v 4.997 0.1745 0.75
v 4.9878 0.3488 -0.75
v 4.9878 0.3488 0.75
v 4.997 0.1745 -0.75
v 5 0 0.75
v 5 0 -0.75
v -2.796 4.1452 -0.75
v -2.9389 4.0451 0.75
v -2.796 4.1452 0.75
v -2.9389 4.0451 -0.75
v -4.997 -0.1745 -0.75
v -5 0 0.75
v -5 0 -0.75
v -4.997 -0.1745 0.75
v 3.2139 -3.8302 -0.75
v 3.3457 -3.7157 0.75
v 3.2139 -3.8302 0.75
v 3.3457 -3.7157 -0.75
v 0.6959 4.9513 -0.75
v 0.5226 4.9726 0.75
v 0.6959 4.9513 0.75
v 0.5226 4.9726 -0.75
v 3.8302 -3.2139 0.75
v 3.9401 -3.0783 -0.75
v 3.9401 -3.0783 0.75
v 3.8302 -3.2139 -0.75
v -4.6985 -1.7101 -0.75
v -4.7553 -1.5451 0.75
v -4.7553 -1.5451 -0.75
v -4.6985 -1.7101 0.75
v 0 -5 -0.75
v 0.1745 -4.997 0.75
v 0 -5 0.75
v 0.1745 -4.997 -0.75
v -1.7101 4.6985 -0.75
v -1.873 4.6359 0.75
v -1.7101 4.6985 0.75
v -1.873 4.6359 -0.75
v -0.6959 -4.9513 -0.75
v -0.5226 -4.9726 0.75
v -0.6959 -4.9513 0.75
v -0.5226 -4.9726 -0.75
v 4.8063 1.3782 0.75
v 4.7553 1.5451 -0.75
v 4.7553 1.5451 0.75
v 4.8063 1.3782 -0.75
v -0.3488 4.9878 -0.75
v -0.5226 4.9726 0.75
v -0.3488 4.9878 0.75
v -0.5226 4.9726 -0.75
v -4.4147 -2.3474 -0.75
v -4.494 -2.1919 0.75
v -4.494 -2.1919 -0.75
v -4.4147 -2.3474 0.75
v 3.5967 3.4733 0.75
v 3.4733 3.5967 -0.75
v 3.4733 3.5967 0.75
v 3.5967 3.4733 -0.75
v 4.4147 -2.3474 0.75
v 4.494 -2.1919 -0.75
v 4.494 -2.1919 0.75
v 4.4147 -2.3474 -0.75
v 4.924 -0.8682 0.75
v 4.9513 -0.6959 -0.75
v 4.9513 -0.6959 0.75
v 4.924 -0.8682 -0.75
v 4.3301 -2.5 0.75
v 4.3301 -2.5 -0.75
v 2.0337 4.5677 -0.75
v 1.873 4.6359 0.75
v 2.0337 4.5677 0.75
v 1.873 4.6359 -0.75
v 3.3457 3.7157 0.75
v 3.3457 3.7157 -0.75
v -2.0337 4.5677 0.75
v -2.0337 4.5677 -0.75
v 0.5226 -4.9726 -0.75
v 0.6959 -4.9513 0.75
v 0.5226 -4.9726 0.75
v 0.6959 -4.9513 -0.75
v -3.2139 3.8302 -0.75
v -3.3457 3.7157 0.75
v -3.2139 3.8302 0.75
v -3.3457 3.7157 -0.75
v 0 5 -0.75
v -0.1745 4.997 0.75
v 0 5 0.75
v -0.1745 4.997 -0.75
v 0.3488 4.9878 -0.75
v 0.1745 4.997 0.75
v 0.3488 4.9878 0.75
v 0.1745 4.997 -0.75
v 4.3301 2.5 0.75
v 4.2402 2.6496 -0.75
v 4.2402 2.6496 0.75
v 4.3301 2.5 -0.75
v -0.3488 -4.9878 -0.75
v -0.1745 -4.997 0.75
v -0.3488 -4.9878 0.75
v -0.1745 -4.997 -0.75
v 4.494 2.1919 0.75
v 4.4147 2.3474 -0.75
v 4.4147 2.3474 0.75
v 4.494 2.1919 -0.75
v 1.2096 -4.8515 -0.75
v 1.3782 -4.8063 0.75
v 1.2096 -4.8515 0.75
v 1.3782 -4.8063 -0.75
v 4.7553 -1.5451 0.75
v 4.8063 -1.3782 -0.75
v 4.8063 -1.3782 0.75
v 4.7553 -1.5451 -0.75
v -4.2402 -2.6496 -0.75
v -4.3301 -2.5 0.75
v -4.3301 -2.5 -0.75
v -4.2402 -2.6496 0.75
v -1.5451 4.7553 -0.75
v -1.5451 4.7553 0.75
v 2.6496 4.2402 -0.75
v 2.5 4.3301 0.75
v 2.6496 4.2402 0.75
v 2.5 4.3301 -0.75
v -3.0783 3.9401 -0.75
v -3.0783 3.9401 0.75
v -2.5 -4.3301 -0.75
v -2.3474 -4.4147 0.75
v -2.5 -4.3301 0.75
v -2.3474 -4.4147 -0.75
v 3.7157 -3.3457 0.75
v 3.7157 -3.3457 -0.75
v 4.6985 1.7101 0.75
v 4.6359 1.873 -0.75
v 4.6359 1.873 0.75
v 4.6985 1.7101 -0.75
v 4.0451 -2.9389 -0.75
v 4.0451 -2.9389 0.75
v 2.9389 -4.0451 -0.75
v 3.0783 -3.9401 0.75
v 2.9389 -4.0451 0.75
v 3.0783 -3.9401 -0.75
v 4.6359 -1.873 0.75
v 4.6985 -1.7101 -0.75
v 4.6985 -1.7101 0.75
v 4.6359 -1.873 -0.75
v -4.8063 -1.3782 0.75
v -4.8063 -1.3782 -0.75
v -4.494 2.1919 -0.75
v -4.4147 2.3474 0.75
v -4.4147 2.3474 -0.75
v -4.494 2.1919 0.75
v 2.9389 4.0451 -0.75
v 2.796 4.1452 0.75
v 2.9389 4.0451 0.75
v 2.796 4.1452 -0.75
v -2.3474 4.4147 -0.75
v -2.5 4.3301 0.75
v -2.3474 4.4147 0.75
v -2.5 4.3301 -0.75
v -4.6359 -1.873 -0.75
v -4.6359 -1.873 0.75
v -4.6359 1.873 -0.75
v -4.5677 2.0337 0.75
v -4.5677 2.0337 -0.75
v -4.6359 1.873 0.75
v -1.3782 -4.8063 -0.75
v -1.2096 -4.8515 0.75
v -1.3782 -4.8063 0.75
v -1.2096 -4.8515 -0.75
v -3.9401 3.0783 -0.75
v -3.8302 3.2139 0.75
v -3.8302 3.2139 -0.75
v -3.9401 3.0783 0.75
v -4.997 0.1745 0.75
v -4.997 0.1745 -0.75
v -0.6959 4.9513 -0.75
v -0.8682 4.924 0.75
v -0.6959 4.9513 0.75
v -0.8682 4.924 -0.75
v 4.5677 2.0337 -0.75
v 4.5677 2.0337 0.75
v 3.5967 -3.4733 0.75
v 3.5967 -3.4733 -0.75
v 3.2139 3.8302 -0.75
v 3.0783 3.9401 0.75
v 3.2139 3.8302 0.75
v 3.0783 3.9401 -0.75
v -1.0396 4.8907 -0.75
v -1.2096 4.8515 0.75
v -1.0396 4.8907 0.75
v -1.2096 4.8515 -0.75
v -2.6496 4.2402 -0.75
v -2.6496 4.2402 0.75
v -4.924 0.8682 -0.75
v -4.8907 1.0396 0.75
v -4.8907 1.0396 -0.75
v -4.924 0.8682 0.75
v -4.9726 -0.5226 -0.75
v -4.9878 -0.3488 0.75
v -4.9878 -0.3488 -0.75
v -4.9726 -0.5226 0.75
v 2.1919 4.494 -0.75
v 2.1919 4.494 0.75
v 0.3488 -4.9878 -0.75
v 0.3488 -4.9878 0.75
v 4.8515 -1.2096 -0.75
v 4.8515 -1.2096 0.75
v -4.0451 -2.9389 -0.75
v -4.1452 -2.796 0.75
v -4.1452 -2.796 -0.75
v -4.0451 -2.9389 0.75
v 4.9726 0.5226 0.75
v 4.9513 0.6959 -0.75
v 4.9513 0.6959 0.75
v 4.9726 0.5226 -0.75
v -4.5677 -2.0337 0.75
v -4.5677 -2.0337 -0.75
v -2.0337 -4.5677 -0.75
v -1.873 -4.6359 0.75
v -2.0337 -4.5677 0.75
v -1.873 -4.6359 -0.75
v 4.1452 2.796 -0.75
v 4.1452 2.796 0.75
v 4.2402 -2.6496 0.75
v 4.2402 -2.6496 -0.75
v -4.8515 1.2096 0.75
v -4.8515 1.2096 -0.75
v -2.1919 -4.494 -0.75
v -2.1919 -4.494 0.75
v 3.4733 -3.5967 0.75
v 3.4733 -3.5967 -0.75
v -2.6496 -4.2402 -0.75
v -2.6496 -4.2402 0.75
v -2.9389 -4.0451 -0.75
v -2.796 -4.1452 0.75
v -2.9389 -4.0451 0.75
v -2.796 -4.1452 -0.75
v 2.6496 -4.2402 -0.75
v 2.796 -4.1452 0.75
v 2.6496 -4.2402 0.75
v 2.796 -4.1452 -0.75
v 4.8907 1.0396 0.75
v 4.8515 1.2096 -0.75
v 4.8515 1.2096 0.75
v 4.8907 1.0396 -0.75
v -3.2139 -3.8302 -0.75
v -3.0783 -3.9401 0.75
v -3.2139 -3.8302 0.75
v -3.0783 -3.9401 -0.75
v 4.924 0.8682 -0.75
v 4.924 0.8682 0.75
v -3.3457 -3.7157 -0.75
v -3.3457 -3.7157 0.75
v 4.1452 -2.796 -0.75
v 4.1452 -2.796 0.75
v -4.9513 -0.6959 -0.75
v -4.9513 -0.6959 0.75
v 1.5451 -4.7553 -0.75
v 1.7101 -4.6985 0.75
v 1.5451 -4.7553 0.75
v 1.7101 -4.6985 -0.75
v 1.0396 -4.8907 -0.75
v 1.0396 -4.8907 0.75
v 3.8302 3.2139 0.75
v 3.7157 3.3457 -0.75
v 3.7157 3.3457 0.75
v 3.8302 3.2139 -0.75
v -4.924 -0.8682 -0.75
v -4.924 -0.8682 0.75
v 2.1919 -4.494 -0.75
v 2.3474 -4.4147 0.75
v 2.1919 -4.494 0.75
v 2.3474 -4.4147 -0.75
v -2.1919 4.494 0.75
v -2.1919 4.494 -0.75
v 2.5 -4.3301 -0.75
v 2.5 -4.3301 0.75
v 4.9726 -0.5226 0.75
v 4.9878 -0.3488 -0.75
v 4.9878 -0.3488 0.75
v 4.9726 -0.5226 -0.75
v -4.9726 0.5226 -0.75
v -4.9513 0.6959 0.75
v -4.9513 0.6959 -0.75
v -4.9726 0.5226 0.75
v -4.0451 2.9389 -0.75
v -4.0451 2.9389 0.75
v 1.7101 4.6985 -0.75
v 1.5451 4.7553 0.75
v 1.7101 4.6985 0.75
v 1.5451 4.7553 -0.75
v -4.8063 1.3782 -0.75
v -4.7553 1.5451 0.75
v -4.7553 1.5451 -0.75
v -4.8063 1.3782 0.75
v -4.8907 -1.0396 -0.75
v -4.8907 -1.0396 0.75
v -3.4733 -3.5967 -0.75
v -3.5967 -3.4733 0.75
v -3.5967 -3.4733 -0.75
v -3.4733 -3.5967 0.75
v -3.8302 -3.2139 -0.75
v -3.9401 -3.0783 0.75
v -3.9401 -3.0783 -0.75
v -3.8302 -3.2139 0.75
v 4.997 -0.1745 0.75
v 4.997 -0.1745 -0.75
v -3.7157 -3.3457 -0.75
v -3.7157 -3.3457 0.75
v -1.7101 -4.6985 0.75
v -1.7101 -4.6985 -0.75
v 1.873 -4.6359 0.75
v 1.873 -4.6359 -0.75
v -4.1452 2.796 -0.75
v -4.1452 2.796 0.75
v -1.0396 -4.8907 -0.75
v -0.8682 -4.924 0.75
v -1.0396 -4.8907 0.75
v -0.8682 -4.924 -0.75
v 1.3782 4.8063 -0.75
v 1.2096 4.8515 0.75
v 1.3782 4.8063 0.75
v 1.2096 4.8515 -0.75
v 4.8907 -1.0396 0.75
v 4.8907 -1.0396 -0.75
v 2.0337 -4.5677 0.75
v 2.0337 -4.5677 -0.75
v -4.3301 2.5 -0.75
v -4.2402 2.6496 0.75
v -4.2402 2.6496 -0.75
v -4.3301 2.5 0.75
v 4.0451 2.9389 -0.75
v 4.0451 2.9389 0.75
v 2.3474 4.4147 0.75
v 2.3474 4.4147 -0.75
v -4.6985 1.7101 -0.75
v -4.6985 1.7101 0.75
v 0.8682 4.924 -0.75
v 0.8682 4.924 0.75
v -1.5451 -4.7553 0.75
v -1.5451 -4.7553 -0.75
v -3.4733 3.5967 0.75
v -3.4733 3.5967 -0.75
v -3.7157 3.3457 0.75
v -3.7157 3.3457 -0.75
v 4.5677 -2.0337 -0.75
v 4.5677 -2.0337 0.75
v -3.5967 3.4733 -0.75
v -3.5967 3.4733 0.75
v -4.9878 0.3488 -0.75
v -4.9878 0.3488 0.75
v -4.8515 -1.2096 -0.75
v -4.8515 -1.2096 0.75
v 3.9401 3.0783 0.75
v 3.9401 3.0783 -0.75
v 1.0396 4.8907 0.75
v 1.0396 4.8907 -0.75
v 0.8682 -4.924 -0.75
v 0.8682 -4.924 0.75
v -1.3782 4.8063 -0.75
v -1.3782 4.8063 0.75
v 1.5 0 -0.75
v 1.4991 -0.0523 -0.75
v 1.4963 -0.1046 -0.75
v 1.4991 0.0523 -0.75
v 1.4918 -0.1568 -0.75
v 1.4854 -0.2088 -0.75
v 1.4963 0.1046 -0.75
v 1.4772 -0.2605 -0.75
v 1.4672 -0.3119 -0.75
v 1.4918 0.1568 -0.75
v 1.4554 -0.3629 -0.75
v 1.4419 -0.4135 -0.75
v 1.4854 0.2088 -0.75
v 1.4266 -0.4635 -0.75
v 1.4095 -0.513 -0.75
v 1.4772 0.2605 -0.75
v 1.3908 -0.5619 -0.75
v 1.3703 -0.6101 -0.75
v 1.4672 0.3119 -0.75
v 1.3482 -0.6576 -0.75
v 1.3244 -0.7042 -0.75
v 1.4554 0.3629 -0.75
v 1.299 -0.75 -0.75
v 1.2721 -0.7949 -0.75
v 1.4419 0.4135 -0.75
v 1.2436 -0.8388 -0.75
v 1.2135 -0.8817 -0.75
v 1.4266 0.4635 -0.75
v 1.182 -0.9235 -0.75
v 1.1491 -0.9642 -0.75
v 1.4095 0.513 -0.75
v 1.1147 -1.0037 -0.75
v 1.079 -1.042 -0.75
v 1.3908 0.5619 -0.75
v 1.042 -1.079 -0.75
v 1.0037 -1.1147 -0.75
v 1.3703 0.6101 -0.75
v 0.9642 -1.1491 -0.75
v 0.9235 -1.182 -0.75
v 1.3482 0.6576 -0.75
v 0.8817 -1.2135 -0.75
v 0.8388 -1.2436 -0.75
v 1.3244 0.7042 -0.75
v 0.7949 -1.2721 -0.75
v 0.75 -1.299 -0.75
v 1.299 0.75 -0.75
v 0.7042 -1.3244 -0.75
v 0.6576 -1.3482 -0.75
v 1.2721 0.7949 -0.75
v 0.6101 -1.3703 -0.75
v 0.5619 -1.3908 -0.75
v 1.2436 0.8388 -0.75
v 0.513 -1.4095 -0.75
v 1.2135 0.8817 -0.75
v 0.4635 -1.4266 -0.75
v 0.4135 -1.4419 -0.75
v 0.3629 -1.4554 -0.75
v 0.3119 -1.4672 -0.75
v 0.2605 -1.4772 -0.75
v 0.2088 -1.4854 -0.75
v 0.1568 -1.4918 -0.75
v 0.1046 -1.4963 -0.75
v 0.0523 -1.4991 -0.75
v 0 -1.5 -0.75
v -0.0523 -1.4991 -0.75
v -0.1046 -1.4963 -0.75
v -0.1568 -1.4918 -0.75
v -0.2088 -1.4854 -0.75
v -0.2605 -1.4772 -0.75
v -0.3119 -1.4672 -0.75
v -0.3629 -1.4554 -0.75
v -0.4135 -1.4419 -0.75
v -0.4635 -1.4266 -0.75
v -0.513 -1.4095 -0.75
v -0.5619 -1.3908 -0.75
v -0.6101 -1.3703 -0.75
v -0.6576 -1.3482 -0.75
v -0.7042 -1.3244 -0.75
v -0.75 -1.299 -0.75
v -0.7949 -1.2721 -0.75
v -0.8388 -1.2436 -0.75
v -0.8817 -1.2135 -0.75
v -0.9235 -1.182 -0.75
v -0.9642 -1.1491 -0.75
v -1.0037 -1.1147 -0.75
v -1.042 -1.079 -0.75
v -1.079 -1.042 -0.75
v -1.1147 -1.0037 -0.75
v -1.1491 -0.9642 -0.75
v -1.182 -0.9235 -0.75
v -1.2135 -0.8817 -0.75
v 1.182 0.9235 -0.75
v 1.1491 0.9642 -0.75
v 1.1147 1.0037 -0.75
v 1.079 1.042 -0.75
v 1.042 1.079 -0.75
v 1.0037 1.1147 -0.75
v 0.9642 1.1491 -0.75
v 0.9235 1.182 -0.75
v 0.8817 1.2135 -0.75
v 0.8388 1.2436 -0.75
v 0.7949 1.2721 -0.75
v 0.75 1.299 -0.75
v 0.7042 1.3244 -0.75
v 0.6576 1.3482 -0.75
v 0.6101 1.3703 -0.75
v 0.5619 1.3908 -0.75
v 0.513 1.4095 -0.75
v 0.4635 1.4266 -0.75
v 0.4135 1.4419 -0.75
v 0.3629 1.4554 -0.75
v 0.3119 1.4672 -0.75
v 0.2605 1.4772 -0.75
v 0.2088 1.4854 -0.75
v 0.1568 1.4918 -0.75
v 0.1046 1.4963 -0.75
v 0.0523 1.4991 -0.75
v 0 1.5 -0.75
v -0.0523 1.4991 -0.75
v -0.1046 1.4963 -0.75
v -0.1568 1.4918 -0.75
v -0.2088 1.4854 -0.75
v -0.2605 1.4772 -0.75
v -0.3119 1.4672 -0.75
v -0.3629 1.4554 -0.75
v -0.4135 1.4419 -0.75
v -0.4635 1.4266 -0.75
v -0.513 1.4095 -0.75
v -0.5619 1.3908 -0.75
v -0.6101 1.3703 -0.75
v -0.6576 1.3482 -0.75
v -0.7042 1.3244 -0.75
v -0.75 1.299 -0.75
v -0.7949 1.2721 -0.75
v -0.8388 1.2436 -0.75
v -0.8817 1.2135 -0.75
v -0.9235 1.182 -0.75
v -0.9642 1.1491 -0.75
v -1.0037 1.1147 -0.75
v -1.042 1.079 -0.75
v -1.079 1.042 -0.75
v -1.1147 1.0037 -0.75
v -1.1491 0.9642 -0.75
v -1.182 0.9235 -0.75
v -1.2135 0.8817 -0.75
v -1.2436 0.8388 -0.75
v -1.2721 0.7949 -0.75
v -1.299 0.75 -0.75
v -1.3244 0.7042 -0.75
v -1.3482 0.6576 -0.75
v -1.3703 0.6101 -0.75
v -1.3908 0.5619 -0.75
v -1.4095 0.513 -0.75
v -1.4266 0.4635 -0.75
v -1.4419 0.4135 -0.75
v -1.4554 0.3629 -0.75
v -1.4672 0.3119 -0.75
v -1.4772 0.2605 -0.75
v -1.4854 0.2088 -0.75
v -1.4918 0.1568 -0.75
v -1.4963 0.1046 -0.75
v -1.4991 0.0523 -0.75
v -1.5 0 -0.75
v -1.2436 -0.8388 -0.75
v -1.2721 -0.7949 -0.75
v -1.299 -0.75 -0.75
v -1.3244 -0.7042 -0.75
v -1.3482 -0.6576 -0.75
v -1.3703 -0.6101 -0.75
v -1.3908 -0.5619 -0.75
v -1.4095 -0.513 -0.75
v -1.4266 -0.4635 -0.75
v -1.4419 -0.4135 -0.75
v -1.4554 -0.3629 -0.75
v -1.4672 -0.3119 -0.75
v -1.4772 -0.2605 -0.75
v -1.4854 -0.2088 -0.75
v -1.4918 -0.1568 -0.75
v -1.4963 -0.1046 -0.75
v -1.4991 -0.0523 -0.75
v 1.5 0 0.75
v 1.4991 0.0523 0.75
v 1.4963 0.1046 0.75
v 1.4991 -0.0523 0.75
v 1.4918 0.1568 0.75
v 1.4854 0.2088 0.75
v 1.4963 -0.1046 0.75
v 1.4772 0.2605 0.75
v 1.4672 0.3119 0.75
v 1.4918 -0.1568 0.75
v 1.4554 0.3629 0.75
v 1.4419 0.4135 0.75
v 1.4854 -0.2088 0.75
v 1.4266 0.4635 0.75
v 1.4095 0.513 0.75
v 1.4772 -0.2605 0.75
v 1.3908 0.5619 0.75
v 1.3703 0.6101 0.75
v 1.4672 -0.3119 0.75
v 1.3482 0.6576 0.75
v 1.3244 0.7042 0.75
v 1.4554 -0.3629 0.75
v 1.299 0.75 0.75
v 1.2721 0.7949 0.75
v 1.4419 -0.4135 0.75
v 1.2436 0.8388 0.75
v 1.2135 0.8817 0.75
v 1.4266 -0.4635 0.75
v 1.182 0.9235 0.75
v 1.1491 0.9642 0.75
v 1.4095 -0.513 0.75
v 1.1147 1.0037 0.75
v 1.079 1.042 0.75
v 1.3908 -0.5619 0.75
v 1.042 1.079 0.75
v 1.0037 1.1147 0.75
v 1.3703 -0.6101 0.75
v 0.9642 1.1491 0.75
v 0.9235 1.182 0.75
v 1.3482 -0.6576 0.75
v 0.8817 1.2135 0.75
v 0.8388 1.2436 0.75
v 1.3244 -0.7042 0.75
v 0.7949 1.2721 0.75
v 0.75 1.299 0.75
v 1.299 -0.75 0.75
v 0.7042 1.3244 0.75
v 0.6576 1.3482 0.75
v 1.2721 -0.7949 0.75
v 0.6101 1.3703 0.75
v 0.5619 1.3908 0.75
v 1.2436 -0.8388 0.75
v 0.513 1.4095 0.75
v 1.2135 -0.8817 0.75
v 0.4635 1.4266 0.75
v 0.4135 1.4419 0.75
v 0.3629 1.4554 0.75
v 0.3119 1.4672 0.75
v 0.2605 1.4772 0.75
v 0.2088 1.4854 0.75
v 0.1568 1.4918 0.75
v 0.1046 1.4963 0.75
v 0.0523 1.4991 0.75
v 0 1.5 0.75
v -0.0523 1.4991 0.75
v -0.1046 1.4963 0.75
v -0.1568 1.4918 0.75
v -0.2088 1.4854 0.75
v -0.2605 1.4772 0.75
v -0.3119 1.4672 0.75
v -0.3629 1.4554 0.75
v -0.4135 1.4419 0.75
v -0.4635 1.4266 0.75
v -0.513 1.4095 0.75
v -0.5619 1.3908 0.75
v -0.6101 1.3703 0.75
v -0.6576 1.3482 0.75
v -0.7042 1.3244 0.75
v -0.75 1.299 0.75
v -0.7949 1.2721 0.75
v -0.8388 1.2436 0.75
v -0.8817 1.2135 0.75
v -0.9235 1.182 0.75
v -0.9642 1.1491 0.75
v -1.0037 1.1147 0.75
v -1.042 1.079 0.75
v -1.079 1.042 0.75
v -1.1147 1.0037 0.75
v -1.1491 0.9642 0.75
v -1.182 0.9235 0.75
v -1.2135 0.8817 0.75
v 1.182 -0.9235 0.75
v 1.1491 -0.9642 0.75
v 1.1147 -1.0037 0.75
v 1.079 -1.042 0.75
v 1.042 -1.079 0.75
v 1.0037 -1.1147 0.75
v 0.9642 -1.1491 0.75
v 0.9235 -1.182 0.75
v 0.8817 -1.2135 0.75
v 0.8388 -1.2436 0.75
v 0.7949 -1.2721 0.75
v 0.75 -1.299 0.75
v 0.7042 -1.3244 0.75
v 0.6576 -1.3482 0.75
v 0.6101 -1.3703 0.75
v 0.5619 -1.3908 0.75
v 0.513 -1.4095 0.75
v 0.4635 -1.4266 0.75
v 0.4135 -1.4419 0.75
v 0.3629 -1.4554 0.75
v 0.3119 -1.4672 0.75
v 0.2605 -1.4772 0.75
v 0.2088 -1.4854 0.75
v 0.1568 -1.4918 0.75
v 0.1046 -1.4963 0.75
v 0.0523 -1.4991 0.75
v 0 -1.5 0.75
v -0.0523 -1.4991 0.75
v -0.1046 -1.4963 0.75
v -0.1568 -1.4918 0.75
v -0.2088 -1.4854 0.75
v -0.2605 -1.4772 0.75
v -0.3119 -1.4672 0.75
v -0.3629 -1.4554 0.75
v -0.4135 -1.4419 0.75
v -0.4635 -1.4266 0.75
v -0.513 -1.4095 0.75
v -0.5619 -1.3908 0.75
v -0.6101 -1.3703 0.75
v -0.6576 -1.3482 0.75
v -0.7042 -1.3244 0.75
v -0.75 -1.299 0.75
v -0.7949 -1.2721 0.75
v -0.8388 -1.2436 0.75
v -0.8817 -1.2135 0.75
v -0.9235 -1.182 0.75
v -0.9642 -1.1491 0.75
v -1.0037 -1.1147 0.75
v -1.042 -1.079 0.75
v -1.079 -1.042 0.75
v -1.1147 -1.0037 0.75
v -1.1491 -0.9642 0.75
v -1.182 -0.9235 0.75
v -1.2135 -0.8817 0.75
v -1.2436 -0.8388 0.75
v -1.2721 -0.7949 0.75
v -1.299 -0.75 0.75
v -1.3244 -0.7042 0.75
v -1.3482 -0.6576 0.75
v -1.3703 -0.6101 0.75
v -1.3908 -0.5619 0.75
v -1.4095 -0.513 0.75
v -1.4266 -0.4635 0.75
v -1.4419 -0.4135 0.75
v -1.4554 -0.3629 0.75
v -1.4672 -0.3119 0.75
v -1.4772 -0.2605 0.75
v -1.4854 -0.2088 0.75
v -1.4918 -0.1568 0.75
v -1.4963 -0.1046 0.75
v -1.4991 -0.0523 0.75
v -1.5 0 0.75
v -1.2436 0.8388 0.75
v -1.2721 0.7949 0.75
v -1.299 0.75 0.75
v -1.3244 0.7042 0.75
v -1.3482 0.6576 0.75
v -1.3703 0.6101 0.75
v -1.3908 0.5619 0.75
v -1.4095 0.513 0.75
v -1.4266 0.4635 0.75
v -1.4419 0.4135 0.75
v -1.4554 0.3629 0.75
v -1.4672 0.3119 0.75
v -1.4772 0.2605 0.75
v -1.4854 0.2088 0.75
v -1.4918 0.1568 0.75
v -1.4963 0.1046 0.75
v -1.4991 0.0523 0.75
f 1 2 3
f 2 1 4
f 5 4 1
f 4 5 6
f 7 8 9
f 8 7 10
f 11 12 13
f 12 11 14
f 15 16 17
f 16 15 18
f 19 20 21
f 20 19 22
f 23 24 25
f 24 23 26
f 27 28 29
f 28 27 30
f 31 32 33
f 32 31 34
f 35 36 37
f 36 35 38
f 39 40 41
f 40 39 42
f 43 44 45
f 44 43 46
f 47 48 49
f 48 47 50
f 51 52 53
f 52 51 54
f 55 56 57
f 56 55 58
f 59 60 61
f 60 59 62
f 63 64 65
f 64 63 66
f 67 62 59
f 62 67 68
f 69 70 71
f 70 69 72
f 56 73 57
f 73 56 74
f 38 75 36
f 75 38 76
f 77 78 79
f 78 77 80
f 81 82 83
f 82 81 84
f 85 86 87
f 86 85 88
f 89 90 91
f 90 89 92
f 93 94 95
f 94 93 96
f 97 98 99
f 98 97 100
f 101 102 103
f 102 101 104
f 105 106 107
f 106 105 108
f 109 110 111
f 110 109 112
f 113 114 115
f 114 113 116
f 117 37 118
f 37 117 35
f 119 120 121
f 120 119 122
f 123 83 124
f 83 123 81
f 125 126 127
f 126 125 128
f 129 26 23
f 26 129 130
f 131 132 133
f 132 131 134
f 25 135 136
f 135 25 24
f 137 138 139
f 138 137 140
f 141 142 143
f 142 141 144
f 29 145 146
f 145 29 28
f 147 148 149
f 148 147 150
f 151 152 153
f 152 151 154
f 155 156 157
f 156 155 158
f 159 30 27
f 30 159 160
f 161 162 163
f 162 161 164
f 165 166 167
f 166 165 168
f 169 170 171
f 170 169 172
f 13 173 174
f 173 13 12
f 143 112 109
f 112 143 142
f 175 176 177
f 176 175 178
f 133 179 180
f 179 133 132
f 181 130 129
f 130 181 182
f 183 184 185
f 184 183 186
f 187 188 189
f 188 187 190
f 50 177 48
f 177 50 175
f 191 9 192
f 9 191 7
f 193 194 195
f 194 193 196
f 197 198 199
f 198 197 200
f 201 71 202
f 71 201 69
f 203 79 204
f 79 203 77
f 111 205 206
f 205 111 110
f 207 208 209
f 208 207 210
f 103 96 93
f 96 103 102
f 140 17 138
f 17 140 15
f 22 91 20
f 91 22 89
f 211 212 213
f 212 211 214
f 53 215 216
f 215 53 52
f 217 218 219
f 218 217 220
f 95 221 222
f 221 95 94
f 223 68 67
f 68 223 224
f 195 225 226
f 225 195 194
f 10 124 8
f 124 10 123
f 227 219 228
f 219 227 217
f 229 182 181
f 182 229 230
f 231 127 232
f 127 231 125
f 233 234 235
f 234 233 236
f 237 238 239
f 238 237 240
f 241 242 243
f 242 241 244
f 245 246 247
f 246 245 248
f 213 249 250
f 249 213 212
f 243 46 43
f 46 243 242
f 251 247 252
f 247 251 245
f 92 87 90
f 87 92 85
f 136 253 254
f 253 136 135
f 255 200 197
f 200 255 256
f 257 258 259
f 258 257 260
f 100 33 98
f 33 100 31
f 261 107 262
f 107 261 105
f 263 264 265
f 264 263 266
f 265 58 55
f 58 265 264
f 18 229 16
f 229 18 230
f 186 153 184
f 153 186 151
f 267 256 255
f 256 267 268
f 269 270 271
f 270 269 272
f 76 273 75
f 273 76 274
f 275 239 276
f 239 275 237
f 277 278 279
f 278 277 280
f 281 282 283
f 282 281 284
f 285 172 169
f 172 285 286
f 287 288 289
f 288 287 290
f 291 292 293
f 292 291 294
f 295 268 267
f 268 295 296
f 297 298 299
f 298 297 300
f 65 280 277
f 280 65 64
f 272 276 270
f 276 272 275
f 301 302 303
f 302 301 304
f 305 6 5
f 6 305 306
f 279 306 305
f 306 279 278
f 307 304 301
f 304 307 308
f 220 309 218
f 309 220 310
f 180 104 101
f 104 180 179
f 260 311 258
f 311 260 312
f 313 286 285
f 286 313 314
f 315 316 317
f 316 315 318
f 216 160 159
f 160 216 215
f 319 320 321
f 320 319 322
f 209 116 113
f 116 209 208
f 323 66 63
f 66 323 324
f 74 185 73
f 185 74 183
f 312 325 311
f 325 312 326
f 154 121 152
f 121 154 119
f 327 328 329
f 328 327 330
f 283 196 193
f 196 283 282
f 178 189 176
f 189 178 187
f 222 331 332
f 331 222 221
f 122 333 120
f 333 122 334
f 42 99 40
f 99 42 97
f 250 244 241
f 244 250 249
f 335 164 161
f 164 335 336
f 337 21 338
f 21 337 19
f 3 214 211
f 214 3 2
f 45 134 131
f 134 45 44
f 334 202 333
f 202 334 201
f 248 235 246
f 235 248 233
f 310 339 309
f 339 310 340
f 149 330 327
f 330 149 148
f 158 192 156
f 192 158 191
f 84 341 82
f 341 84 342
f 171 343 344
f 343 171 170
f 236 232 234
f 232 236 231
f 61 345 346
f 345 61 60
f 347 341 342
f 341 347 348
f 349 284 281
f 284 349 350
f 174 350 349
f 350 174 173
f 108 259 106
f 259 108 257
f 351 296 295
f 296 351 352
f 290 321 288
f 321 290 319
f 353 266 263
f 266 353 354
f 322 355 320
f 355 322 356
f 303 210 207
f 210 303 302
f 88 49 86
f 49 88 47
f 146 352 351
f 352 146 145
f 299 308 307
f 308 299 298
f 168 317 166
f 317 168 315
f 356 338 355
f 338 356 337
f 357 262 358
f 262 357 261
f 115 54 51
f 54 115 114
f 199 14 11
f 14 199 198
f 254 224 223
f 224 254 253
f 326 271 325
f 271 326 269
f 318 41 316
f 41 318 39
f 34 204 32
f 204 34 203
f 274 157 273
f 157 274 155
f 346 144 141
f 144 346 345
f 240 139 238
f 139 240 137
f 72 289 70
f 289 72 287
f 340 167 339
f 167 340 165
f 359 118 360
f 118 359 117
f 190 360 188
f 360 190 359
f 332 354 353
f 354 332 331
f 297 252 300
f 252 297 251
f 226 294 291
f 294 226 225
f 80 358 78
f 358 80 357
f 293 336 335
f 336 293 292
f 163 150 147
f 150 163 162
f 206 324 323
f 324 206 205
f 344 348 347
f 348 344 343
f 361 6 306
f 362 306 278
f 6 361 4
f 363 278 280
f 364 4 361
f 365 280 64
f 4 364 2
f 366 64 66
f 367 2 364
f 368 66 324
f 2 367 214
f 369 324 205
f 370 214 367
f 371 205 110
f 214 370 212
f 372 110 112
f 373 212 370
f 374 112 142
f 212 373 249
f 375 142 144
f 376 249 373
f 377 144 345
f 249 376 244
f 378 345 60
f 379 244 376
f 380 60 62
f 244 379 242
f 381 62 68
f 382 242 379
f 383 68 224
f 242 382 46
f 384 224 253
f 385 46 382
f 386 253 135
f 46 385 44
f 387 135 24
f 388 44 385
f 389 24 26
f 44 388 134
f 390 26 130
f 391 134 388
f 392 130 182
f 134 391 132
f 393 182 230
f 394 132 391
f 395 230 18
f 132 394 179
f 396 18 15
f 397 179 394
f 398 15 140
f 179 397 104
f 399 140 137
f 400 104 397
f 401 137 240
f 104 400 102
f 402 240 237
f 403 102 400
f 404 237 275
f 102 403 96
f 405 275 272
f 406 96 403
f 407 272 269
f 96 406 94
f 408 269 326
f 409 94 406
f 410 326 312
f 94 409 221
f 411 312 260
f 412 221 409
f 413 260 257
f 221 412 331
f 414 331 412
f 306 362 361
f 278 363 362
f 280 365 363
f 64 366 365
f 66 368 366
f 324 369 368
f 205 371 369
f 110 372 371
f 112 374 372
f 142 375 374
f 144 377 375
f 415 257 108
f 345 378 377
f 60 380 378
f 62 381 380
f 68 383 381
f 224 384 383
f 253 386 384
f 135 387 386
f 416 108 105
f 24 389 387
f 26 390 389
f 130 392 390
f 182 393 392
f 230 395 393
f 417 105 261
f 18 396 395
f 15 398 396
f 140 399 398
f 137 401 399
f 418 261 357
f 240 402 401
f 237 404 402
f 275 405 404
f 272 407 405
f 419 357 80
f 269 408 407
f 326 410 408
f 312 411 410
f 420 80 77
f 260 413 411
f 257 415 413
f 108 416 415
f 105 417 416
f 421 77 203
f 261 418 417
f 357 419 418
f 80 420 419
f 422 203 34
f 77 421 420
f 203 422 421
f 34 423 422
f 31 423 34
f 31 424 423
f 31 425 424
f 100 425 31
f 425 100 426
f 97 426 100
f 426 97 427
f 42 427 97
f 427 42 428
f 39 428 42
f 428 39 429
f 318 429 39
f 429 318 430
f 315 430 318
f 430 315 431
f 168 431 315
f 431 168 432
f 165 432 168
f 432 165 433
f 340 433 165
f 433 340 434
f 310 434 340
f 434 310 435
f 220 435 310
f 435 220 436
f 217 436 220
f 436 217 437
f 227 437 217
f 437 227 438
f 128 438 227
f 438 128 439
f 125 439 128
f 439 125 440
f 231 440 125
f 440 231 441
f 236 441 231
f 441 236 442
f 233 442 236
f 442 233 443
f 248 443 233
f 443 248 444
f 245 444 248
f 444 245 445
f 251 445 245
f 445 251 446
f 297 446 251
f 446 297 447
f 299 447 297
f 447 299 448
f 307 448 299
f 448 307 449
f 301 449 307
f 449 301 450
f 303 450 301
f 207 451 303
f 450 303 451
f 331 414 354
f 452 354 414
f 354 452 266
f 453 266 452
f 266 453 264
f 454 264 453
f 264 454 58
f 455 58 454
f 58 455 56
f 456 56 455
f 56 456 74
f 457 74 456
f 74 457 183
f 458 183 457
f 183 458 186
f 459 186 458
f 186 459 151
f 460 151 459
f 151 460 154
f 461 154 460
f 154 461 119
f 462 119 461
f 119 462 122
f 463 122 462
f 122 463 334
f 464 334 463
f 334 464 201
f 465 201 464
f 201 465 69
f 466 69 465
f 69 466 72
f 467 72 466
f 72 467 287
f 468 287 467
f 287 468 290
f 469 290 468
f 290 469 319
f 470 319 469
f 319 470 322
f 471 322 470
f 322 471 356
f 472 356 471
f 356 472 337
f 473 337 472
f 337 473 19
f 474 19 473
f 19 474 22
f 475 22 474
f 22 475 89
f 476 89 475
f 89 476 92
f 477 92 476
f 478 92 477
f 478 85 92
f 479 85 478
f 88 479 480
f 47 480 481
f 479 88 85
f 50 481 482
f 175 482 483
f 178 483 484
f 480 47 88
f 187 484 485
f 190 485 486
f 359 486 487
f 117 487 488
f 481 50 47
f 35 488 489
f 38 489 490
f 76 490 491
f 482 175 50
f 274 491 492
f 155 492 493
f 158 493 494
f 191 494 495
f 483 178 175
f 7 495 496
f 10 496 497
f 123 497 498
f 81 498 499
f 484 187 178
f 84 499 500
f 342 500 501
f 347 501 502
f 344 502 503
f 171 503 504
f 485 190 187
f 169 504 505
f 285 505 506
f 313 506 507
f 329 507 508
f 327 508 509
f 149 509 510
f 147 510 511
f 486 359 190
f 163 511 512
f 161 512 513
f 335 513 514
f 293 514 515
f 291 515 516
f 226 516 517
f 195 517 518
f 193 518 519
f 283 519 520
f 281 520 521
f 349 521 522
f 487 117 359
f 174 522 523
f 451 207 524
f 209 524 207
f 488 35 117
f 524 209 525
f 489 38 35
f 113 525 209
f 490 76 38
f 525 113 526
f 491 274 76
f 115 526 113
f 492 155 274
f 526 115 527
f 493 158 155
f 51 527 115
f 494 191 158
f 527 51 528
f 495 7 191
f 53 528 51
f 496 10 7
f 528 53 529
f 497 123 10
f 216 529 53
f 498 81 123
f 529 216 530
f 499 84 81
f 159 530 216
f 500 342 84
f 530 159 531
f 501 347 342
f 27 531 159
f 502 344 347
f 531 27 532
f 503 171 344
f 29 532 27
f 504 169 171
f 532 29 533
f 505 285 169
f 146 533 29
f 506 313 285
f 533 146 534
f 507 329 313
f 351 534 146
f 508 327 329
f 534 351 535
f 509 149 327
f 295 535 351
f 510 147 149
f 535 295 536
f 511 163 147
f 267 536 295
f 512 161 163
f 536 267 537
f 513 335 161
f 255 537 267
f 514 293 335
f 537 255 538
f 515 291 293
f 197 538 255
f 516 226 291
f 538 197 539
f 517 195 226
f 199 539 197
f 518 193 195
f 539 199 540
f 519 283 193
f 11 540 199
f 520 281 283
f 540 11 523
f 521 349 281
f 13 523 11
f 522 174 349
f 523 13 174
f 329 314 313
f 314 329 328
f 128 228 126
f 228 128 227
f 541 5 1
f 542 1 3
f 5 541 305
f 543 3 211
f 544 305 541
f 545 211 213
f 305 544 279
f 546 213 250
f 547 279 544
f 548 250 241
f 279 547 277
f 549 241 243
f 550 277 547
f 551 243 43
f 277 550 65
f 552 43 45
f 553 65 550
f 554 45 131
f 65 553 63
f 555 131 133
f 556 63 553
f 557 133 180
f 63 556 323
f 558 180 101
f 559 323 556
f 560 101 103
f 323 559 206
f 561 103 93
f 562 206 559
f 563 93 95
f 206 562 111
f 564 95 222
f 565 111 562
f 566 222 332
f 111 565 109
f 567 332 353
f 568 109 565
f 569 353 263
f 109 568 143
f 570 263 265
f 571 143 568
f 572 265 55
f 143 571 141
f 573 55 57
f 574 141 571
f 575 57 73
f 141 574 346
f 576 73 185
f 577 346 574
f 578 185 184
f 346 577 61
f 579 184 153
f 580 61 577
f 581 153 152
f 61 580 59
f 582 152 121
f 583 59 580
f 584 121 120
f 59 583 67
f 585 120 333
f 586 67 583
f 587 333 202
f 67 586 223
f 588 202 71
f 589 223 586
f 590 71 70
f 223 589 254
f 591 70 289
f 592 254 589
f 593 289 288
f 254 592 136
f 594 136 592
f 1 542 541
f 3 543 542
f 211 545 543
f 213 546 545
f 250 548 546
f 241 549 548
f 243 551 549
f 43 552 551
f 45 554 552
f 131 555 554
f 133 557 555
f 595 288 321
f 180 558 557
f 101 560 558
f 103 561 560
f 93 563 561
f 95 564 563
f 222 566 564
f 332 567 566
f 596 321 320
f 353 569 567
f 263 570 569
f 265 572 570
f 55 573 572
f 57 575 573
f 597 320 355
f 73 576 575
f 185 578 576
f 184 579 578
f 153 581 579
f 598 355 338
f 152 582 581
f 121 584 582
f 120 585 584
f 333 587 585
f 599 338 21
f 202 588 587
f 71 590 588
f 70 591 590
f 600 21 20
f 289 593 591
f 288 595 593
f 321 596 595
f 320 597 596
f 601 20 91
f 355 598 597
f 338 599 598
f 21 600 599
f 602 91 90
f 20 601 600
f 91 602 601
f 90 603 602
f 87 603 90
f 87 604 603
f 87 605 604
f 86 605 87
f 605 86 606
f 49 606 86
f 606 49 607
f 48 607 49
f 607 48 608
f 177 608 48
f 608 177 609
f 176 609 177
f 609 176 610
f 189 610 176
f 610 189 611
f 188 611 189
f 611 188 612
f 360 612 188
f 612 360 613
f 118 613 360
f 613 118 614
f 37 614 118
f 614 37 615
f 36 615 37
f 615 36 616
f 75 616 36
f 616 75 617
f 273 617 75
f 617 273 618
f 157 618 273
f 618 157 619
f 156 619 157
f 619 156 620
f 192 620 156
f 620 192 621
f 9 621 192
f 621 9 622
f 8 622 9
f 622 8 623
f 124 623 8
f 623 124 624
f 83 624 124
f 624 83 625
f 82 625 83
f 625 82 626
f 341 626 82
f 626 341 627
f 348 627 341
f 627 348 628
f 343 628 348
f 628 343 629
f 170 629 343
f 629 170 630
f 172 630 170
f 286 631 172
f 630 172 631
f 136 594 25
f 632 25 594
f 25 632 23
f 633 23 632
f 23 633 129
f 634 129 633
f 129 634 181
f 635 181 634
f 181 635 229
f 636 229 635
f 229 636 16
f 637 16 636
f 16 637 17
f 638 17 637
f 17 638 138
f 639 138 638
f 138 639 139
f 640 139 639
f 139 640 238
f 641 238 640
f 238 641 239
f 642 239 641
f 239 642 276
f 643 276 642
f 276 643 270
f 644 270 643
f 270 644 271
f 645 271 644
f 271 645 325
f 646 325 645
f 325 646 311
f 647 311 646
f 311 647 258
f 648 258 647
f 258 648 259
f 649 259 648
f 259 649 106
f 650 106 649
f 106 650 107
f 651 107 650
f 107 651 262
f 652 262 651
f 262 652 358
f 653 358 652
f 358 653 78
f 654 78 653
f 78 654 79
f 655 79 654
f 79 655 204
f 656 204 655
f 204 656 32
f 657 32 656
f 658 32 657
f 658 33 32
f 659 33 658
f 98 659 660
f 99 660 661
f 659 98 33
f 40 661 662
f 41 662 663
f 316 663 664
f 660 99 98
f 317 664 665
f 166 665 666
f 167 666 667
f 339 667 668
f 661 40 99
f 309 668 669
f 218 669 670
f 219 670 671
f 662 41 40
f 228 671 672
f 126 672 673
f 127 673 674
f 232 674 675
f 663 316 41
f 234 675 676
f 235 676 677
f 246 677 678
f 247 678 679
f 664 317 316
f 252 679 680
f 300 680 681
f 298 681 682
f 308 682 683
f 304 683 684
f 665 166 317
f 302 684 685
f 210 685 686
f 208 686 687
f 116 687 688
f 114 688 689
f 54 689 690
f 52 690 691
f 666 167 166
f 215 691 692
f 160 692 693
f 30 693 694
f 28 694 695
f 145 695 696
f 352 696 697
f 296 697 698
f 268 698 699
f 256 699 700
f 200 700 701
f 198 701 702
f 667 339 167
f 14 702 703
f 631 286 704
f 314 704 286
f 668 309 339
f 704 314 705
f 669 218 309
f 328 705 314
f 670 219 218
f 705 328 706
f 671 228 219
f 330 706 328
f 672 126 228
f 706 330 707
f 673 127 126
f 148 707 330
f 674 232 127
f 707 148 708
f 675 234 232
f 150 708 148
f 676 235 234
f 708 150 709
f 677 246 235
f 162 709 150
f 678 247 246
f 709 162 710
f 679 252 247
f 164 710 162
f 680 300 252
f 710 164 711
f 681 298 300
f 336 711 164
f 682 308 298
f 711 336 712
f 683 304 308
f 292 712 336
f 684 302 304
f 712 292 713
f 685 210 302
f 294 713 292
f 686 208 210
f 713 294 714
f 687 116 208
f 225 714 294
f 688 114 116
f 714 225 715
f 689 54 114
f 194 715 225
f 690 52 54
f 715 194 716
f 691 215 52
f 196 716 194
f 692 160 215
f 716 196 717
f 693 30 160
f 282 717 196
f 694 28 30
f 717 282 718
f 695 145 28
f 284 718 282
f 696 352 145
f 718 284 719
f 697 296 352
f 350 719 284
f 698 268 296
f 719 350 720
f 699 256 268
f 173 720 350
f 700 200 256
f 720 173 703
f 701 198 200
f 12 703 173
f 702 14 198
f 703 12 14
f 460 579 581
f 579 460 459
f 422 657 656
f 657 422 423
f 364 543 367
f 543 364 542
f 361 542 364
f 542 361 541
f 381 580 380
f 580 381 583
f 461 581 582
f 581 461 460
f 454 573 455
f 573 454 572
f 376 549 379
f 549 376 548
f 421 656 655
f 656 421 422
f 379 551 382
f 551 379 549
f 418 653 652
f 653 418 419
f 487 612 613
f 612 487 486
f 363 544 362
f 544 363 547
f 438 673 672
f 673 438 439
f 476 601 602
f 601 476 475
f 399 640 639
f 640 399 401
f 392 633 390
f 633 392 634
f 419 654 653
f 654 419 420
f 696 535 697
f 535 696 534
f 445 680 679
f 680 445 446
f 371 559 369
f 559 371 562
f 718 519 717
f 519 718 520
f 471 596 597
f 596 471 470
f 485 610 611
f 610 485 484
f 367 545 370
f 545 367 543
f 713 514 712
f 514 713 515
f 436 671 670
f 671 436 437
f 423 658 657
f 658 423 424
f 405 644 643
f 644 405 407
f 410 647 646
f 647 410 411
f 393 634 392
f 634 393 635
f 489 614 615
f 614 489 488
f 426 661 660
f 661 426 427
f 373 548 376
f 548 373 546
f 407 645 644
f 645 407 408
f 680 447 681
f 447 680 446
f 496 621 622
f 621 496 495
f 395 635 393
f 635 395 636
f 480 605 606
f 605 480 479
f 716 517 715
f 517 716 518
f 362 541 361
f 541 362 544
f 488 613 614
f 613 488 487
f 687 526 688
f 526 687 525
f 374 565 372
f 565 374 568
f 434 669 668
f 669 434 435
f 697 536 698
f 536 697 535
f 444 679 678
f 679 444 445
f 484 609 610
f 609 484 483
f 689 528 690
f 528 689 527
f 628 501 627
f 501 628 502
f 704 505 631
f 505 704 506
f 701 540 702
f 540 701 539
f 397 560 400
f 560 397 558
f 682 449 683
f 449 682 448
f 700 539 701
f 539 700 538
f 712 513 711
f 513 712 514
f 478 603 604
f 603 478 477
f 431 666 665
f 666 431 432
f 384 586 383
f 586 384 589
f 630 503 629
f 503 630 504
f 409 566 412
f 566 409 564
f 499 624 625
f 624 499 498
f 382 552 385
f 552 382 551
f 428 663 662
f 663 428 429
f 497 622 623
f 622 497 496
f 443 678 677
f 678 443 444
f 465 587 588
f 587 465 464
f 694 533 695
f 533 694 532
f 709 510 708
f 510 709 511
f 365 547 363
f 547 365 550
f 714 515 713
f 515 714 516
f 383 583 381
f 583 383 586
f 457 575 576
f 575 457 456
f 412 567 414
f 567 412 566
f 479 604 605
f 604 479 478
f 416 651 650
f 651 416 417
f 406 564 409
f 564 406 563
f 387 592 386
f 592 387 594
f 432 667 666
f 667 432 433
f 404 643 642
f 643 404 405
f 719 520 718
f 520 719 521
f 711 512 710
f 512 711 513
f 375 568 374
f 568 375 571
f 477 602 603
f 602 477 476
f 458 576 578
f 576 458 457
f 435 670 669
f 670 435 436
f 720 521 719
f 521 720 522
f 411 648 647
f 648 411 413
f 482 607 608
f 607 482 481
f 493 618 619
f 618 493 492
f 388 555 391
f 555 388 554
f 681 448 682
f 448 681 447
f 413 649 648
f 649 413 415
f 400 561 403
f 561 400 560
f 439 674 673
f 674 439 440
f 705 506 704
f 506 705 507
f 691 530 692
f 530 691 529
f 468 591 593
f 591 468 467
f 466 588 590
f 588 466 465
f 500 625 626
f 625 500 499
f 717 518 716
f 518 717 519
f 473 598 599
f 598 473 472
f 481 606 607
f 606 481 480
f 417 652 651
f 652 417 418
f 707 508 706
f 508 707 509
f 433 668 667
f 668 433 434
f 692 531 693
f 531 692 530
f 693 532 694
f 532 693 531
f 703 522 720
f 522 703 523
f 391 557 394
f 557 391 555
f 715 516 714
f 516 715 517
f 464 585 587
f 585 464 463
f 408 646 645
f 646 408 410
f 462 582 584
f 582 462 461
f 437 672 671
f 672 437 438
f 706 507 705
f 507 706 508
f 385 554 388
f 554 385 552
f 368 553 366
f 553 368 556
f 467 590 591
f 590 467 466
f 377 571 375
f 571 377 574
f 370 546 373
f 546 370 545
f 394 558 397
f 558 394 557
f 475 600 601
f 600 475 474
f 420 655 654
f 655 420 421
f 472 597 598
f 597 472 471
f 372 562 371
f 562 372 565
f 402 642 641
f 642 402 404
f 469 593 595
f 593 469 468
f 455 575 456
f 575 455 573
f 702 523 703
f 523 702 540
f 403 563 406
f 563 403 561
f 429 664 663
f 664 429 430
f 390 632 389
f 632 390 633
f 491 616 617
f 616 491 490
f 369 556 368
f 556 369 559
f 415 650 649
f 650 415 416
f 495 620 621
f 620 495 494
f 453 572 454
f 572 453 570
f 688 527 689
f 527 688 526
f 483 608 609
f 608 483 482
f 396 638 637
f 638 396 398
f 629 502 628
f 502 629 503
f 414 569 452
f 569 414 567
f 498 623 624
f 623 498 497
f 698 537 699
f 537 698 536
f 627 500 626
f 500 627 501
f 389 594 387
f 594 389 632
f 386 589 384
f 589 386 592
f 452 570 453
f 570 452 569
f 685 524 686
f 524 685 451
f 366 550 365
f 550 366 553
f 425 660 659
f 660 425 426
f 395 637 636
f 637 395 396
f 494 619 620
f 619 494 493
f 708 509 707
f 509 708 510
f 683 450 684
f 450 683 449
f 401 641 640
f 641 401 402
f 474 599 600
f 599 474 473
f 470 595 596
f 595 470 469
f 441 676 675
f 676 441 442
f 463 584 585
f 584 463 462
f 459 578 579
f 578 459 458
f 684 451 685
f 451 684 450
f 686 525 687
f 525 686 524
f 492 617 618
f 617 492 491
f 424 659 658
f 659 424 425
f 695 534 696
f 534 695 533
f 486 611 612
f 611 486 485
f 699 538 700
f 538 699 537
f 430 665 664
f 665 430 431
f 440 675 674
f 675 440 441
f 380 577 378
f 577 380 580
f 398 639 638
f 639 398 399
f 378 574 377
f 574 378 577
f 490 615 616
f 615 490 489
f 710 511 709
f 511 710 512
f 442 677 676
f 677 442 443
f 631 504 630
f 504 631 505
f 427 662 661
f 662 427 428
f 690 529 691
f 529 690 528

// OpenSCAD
// Rubber washer: 3.0mm ID, 10.0mm OD, 1.5mm thickness

$fn = 180;  // high resolution for perfectly round circles

outer_diameter = 10.0;
inner_diameter = 3.0;
thickness      = 1.5;

overlap = 0.02; // tiny overlap to ensure clean boolean results

module washer(od, id, h) {
    difference() {
        cylinder(d=od, h=h, center=true);
        cylinder(d=id, h=h + 2*overlap, center=true);
    }
}

color([0.2, 0.2, 0.2])
washer(outer_diameter, inner_diameter, thickness);
